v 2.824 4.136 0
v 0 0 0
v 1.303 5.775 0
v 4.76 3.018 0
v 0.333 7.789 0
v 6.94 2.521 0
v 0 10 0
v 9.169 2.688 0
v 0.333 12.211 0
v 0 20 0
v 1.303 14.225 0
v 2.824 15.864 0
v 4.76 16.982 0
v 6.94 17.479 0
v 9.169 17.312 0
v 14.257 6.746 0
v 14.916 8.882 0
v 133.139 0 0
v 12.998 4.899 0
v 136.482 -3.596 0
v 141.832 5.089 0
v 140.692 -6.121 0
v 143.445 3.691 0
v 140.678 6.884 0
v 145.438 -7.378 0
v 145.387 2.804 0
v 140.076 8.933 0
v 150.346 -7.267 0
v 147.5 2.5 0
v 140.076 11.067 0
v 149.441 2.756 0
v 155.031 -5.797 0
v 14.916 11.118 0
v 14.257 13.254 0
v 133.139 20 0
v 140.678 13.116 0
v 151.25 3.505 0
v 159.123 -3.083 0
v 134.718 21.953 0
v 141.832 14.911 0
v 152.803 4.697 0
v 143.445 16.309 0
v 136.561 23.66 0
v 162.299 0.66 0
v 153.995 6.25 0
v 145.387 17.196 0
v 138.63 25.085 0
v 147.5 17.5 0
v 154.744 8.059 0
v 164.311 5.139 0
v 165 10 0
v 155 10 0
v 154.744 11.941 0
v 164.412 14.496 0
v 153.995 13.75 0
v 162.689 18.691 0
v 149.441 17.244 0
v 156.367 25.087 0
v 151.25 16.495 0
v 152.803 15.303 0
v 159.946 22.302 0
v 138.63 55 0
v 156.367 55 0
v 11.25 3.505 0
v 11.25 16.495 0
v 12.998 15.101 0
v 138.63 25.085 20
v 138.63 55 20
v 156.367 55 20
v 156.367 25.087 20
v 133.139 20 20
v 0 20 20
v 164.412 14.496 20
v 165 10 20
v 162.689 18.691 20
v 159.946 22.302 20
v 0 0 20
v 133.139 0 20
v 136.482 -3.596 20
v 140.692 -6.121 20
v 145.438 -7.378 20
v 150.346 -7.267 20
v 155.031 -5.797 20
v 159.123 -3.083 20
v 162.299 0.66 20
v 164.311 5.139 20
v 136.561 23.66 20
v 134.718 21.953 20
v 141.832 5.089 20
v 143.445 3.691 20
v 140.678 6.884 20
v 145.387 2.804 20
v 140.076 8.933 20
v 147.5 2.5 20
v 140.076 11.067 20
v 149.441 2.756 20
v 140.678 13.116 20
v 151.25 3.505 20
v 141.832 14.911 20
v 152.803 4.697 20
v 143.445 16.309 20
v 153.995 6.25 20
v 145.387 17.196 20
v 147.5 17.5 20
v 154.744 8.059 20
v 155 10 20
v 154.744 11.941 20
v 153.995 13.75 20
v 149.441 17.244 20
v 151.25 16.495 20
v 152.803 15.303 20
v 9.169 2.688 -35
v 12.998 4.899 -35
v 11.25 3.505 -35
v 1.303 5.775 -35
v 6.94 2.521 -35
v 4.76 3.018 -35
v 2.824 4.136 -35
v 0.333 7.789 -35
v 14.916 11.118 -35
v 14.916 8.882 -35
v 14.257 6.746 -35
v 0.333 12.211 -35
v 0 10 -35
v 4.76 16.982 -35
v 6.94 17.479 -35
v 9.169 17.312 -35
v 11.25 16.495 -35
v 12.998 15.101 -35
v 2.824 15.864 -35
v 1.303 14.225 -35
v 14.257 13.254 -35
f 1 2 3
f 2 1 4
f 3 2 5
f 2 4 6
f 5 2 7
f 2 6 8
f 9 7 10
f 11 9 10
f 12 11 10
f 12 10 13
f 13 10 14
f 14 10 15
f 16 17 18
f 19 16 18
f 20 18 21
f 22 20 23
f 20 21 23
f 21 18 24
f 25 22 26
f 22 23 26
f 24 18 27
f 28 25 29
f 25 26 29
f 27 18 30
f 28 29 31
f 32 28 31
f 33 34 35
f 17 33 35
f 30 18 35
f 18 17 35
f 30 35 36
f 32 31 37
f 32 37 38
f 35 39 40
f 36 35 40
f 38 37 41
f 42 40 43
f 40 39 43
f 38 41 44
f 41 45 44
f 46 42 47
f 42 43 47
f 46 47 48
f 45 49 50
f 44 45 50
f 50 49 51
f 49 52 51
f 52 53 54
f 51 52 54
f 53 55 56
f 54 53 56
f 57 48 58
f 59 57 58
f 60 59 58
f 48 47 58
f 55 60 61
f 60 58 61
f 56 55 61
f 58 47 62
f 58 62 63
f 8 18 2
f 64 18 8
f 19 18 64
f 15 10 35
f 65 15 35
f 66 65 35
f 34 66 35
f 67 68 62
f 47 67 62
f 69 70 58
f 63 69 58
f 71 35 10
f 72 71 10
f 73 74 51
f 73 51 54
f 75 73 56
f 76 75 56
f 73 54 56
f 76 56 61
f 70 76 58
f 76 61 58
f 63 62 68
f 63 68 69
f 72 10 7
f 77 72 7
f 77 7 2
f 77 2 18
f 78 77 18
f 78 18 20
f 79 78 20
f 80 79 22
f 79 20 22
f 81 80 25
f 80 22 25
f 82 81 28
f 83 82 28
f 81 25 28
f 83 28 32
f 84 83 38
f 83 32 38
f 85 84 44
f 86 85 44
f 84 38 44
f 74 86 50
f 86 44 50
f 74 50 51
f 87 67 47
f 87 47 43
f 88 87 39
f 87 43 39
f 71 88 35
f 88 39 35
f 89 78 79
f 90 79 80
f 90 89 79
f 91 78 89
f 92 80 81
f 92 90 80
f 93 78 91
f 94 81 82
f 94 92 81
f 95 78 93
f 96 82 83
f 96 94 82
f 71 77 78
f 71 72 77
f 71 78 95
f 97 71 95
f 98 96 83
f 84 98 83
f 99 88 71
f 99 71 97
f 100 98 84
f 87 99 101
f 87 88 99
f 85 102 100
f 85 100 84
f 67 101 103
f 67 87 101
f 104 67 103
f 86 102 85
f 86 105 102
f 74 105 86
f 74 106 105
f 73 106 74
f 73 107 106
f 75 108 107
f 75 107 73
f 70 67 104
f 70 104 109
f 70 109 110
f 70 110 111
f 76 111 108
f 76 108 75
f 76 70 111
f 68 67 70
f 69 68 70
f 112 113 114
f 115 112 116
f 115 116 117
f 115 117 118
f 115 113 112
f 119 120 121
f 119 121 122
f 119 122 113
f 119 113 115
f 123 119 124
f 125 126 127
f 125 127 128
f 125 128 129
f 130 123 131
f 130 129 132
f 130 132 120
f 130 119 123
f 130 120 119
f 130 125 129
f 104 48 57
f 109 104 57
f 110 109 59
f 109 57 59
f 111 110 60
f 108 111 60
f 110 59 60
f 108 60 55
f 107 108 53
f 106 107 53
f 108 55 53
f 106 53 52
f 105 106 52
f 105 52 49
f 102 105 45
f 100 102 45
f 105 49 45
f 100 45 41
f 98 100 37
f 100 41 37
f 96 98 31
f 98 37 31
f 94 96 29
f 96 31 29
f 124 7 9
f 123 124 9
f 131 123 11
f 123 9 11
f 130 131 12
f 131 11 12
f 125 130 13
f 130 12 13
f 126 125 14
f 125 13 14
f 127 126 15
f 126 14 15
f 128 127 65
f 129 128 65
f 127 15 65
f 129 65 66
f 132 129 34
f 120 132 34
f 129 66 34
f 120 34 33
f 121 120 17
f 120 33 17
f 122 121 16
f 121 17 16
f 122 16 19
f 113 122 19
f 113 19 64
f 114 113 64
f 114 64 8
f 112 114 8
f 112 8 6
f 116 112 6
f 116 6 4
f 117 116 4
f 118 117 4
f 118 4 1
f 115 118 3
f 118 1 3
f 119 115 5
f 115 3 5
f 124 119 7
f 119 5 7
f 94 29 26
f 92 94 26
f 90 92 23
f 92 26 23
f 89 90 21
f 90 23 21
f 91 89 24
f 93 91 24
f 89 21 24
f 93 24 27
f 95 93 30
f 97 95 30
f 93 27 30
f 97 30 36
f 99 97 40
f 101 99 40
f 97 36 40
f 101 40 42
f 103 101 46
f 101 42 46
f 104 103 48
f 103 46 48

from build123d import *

# Parameters (mm, degrees)
SKETCH1_R           = 7.5
BOSS_EXTRUDE5_DEPTH = 20
SKETCH2_R           = 7.5
BOSS_EXTRUDE6_DEPTH = 35
SKETCH3_W           = 17.737554882
SKETCH3_H           = 20
BOSS_EXTRUDE7_DEPTH = 30


with BuildPart() as part:
    # Sketch1 → Boss-Extrude5 (new body)
    # profile 1 of 6: a face of its own
    with BuildSketch(Plane.XY):
        with BuildLine():
            ThreePointArc((133.138593384, 0), (130, 10), (133.138593384, 20))
            Line((133.138593384, 20), (0, 20))
            Line((0, 20), (0, 10))
            Line((0, 10), (0, 0))
            Line((0, 0), (133.138593384, 0))
        make_face()
        with BuildLine():
            ThreePointArc((15, 10), (7.5, 2.5), (0, 10))
            ThreePointArc((0, 10), (7.5, 17.5), (15, 10))
        make_face(mode=Mode.SUBTRACT)
    # profile 2 of 6: a face of its own
    with BuildSketch(Plane.XY):
        with BuildLine():
            ThreePointArc((147.5, 2.5), (140, 10), (147.5, 17.5))
            Line((147.5, 17.5), (147.5, 20))
            Line((147.5, 20), (133.138593384, 20))
            ThreePointArc((133.138593384, 20), (130, 10), (133.138593384, 0))
            Line((133.138593384, 0), (147.5, 0))
            Line((147.5, 0), (147.5, 2.5))
        make_face()
    # profile 3 of 6: a face of its own
    with BuildSketch(Plane.XY):
        with BuildLine():
            Line((147.5, 20), (147.5, 17.5))
            ThreePointArc((147.5, 17.5), (152.803300859, 15.303300859), (155, 10))
            ThreePointArc((155, 10), (152.803300859, 4.696699141), (147.5, 2.5))
            Line((147.5, 2.5), (147.5, 0))
            Line((147.5, 0), (133.138593384, 0))
            ThreePointArc((133.138593384, 0), (152.740485866, -6.696925103), (165, 10))
            ThreePointArc((165, 10), (152.740485866, 26.696925103), (133.138593384, 20))
            Line((133.138593384, 20), (147.5, 20))
        make_face()
    # profile 4 of 6: a face of its own
    with BuildSketch(Plane.XY):
        with Locations((7.5, 10)):
            Circle(SKETCH1_R)
    # profile 5 of 6: a face of its own
    with BuildSketch(Plane.XY):
        with BuildLine():
            ThreePointArc((147.5, 2.5), (140, 10), (147.5, 17.5))
            Line((147.5, 17.5), (147.5, 20))
            Line((147.5, 20), (133.138593384, 20))
            ThreePointArc((133.138593384, 20), (130, 10), (133.138593384, 0))
            Line((133.138593384, 0), (147.5, 0))
            Line((147.5, 0), (147.5, 2.5))
        make_face()
    # profile 6 of 6: a face of its own
    with BuildSketch(Plane.XY):
        with BuildLine():
            Line((147.5, 20), (147.5, 17.5))
            ThreePointArc((147.5, 17.5), (152.803300859, 15.303300859), (155, 10))
            ThreePointArc((155, 10), (152.803300859, 4.696699141), (147.5, 2.5))
            Line((147.5, 2.5), (147.5, 0))
            Line((147.5, 0), (133.138593384, 0))
            ThreePointArc((133.138593384, 0), (152.740485866, -6.696925103), (165, 10))
            ThreePointArc((165, 10), (152.740485866, 26.696925103), (133.138593384, 20))
            Line((133.138593384, 20), (147.5, 20))
        make_face()
    extrude(amount=BOSS_EXTRUDE5_DEPTH)

    # Sketch2 → Boss-Extrude6 (add)
    with BuildSketch(Plane(origin=(0, 0, 0), x_dir=(-1, 0, 0), z_dir=(0, 0, -1))):
        with Locations((-7.5, 10)):
            Circle(SKETCH2_R)
    extrude(amount=BOSS_EXTRUDE6_DEPTH)

    # Sketch3 → Boss-Extrude7 (add)
    with BuildSketch(Plane(origin=(0, 25, 0), x_dir=(1, 0, 0), z_dir=(0, 1, 0))):
        with Locations((147.498702773, -10)):
            Rectangle(SKETCH3_W, SKETCH3_H)
    extrude(amount=BOSS_EXTRUDE7_DEPTH)


solid = part.part
